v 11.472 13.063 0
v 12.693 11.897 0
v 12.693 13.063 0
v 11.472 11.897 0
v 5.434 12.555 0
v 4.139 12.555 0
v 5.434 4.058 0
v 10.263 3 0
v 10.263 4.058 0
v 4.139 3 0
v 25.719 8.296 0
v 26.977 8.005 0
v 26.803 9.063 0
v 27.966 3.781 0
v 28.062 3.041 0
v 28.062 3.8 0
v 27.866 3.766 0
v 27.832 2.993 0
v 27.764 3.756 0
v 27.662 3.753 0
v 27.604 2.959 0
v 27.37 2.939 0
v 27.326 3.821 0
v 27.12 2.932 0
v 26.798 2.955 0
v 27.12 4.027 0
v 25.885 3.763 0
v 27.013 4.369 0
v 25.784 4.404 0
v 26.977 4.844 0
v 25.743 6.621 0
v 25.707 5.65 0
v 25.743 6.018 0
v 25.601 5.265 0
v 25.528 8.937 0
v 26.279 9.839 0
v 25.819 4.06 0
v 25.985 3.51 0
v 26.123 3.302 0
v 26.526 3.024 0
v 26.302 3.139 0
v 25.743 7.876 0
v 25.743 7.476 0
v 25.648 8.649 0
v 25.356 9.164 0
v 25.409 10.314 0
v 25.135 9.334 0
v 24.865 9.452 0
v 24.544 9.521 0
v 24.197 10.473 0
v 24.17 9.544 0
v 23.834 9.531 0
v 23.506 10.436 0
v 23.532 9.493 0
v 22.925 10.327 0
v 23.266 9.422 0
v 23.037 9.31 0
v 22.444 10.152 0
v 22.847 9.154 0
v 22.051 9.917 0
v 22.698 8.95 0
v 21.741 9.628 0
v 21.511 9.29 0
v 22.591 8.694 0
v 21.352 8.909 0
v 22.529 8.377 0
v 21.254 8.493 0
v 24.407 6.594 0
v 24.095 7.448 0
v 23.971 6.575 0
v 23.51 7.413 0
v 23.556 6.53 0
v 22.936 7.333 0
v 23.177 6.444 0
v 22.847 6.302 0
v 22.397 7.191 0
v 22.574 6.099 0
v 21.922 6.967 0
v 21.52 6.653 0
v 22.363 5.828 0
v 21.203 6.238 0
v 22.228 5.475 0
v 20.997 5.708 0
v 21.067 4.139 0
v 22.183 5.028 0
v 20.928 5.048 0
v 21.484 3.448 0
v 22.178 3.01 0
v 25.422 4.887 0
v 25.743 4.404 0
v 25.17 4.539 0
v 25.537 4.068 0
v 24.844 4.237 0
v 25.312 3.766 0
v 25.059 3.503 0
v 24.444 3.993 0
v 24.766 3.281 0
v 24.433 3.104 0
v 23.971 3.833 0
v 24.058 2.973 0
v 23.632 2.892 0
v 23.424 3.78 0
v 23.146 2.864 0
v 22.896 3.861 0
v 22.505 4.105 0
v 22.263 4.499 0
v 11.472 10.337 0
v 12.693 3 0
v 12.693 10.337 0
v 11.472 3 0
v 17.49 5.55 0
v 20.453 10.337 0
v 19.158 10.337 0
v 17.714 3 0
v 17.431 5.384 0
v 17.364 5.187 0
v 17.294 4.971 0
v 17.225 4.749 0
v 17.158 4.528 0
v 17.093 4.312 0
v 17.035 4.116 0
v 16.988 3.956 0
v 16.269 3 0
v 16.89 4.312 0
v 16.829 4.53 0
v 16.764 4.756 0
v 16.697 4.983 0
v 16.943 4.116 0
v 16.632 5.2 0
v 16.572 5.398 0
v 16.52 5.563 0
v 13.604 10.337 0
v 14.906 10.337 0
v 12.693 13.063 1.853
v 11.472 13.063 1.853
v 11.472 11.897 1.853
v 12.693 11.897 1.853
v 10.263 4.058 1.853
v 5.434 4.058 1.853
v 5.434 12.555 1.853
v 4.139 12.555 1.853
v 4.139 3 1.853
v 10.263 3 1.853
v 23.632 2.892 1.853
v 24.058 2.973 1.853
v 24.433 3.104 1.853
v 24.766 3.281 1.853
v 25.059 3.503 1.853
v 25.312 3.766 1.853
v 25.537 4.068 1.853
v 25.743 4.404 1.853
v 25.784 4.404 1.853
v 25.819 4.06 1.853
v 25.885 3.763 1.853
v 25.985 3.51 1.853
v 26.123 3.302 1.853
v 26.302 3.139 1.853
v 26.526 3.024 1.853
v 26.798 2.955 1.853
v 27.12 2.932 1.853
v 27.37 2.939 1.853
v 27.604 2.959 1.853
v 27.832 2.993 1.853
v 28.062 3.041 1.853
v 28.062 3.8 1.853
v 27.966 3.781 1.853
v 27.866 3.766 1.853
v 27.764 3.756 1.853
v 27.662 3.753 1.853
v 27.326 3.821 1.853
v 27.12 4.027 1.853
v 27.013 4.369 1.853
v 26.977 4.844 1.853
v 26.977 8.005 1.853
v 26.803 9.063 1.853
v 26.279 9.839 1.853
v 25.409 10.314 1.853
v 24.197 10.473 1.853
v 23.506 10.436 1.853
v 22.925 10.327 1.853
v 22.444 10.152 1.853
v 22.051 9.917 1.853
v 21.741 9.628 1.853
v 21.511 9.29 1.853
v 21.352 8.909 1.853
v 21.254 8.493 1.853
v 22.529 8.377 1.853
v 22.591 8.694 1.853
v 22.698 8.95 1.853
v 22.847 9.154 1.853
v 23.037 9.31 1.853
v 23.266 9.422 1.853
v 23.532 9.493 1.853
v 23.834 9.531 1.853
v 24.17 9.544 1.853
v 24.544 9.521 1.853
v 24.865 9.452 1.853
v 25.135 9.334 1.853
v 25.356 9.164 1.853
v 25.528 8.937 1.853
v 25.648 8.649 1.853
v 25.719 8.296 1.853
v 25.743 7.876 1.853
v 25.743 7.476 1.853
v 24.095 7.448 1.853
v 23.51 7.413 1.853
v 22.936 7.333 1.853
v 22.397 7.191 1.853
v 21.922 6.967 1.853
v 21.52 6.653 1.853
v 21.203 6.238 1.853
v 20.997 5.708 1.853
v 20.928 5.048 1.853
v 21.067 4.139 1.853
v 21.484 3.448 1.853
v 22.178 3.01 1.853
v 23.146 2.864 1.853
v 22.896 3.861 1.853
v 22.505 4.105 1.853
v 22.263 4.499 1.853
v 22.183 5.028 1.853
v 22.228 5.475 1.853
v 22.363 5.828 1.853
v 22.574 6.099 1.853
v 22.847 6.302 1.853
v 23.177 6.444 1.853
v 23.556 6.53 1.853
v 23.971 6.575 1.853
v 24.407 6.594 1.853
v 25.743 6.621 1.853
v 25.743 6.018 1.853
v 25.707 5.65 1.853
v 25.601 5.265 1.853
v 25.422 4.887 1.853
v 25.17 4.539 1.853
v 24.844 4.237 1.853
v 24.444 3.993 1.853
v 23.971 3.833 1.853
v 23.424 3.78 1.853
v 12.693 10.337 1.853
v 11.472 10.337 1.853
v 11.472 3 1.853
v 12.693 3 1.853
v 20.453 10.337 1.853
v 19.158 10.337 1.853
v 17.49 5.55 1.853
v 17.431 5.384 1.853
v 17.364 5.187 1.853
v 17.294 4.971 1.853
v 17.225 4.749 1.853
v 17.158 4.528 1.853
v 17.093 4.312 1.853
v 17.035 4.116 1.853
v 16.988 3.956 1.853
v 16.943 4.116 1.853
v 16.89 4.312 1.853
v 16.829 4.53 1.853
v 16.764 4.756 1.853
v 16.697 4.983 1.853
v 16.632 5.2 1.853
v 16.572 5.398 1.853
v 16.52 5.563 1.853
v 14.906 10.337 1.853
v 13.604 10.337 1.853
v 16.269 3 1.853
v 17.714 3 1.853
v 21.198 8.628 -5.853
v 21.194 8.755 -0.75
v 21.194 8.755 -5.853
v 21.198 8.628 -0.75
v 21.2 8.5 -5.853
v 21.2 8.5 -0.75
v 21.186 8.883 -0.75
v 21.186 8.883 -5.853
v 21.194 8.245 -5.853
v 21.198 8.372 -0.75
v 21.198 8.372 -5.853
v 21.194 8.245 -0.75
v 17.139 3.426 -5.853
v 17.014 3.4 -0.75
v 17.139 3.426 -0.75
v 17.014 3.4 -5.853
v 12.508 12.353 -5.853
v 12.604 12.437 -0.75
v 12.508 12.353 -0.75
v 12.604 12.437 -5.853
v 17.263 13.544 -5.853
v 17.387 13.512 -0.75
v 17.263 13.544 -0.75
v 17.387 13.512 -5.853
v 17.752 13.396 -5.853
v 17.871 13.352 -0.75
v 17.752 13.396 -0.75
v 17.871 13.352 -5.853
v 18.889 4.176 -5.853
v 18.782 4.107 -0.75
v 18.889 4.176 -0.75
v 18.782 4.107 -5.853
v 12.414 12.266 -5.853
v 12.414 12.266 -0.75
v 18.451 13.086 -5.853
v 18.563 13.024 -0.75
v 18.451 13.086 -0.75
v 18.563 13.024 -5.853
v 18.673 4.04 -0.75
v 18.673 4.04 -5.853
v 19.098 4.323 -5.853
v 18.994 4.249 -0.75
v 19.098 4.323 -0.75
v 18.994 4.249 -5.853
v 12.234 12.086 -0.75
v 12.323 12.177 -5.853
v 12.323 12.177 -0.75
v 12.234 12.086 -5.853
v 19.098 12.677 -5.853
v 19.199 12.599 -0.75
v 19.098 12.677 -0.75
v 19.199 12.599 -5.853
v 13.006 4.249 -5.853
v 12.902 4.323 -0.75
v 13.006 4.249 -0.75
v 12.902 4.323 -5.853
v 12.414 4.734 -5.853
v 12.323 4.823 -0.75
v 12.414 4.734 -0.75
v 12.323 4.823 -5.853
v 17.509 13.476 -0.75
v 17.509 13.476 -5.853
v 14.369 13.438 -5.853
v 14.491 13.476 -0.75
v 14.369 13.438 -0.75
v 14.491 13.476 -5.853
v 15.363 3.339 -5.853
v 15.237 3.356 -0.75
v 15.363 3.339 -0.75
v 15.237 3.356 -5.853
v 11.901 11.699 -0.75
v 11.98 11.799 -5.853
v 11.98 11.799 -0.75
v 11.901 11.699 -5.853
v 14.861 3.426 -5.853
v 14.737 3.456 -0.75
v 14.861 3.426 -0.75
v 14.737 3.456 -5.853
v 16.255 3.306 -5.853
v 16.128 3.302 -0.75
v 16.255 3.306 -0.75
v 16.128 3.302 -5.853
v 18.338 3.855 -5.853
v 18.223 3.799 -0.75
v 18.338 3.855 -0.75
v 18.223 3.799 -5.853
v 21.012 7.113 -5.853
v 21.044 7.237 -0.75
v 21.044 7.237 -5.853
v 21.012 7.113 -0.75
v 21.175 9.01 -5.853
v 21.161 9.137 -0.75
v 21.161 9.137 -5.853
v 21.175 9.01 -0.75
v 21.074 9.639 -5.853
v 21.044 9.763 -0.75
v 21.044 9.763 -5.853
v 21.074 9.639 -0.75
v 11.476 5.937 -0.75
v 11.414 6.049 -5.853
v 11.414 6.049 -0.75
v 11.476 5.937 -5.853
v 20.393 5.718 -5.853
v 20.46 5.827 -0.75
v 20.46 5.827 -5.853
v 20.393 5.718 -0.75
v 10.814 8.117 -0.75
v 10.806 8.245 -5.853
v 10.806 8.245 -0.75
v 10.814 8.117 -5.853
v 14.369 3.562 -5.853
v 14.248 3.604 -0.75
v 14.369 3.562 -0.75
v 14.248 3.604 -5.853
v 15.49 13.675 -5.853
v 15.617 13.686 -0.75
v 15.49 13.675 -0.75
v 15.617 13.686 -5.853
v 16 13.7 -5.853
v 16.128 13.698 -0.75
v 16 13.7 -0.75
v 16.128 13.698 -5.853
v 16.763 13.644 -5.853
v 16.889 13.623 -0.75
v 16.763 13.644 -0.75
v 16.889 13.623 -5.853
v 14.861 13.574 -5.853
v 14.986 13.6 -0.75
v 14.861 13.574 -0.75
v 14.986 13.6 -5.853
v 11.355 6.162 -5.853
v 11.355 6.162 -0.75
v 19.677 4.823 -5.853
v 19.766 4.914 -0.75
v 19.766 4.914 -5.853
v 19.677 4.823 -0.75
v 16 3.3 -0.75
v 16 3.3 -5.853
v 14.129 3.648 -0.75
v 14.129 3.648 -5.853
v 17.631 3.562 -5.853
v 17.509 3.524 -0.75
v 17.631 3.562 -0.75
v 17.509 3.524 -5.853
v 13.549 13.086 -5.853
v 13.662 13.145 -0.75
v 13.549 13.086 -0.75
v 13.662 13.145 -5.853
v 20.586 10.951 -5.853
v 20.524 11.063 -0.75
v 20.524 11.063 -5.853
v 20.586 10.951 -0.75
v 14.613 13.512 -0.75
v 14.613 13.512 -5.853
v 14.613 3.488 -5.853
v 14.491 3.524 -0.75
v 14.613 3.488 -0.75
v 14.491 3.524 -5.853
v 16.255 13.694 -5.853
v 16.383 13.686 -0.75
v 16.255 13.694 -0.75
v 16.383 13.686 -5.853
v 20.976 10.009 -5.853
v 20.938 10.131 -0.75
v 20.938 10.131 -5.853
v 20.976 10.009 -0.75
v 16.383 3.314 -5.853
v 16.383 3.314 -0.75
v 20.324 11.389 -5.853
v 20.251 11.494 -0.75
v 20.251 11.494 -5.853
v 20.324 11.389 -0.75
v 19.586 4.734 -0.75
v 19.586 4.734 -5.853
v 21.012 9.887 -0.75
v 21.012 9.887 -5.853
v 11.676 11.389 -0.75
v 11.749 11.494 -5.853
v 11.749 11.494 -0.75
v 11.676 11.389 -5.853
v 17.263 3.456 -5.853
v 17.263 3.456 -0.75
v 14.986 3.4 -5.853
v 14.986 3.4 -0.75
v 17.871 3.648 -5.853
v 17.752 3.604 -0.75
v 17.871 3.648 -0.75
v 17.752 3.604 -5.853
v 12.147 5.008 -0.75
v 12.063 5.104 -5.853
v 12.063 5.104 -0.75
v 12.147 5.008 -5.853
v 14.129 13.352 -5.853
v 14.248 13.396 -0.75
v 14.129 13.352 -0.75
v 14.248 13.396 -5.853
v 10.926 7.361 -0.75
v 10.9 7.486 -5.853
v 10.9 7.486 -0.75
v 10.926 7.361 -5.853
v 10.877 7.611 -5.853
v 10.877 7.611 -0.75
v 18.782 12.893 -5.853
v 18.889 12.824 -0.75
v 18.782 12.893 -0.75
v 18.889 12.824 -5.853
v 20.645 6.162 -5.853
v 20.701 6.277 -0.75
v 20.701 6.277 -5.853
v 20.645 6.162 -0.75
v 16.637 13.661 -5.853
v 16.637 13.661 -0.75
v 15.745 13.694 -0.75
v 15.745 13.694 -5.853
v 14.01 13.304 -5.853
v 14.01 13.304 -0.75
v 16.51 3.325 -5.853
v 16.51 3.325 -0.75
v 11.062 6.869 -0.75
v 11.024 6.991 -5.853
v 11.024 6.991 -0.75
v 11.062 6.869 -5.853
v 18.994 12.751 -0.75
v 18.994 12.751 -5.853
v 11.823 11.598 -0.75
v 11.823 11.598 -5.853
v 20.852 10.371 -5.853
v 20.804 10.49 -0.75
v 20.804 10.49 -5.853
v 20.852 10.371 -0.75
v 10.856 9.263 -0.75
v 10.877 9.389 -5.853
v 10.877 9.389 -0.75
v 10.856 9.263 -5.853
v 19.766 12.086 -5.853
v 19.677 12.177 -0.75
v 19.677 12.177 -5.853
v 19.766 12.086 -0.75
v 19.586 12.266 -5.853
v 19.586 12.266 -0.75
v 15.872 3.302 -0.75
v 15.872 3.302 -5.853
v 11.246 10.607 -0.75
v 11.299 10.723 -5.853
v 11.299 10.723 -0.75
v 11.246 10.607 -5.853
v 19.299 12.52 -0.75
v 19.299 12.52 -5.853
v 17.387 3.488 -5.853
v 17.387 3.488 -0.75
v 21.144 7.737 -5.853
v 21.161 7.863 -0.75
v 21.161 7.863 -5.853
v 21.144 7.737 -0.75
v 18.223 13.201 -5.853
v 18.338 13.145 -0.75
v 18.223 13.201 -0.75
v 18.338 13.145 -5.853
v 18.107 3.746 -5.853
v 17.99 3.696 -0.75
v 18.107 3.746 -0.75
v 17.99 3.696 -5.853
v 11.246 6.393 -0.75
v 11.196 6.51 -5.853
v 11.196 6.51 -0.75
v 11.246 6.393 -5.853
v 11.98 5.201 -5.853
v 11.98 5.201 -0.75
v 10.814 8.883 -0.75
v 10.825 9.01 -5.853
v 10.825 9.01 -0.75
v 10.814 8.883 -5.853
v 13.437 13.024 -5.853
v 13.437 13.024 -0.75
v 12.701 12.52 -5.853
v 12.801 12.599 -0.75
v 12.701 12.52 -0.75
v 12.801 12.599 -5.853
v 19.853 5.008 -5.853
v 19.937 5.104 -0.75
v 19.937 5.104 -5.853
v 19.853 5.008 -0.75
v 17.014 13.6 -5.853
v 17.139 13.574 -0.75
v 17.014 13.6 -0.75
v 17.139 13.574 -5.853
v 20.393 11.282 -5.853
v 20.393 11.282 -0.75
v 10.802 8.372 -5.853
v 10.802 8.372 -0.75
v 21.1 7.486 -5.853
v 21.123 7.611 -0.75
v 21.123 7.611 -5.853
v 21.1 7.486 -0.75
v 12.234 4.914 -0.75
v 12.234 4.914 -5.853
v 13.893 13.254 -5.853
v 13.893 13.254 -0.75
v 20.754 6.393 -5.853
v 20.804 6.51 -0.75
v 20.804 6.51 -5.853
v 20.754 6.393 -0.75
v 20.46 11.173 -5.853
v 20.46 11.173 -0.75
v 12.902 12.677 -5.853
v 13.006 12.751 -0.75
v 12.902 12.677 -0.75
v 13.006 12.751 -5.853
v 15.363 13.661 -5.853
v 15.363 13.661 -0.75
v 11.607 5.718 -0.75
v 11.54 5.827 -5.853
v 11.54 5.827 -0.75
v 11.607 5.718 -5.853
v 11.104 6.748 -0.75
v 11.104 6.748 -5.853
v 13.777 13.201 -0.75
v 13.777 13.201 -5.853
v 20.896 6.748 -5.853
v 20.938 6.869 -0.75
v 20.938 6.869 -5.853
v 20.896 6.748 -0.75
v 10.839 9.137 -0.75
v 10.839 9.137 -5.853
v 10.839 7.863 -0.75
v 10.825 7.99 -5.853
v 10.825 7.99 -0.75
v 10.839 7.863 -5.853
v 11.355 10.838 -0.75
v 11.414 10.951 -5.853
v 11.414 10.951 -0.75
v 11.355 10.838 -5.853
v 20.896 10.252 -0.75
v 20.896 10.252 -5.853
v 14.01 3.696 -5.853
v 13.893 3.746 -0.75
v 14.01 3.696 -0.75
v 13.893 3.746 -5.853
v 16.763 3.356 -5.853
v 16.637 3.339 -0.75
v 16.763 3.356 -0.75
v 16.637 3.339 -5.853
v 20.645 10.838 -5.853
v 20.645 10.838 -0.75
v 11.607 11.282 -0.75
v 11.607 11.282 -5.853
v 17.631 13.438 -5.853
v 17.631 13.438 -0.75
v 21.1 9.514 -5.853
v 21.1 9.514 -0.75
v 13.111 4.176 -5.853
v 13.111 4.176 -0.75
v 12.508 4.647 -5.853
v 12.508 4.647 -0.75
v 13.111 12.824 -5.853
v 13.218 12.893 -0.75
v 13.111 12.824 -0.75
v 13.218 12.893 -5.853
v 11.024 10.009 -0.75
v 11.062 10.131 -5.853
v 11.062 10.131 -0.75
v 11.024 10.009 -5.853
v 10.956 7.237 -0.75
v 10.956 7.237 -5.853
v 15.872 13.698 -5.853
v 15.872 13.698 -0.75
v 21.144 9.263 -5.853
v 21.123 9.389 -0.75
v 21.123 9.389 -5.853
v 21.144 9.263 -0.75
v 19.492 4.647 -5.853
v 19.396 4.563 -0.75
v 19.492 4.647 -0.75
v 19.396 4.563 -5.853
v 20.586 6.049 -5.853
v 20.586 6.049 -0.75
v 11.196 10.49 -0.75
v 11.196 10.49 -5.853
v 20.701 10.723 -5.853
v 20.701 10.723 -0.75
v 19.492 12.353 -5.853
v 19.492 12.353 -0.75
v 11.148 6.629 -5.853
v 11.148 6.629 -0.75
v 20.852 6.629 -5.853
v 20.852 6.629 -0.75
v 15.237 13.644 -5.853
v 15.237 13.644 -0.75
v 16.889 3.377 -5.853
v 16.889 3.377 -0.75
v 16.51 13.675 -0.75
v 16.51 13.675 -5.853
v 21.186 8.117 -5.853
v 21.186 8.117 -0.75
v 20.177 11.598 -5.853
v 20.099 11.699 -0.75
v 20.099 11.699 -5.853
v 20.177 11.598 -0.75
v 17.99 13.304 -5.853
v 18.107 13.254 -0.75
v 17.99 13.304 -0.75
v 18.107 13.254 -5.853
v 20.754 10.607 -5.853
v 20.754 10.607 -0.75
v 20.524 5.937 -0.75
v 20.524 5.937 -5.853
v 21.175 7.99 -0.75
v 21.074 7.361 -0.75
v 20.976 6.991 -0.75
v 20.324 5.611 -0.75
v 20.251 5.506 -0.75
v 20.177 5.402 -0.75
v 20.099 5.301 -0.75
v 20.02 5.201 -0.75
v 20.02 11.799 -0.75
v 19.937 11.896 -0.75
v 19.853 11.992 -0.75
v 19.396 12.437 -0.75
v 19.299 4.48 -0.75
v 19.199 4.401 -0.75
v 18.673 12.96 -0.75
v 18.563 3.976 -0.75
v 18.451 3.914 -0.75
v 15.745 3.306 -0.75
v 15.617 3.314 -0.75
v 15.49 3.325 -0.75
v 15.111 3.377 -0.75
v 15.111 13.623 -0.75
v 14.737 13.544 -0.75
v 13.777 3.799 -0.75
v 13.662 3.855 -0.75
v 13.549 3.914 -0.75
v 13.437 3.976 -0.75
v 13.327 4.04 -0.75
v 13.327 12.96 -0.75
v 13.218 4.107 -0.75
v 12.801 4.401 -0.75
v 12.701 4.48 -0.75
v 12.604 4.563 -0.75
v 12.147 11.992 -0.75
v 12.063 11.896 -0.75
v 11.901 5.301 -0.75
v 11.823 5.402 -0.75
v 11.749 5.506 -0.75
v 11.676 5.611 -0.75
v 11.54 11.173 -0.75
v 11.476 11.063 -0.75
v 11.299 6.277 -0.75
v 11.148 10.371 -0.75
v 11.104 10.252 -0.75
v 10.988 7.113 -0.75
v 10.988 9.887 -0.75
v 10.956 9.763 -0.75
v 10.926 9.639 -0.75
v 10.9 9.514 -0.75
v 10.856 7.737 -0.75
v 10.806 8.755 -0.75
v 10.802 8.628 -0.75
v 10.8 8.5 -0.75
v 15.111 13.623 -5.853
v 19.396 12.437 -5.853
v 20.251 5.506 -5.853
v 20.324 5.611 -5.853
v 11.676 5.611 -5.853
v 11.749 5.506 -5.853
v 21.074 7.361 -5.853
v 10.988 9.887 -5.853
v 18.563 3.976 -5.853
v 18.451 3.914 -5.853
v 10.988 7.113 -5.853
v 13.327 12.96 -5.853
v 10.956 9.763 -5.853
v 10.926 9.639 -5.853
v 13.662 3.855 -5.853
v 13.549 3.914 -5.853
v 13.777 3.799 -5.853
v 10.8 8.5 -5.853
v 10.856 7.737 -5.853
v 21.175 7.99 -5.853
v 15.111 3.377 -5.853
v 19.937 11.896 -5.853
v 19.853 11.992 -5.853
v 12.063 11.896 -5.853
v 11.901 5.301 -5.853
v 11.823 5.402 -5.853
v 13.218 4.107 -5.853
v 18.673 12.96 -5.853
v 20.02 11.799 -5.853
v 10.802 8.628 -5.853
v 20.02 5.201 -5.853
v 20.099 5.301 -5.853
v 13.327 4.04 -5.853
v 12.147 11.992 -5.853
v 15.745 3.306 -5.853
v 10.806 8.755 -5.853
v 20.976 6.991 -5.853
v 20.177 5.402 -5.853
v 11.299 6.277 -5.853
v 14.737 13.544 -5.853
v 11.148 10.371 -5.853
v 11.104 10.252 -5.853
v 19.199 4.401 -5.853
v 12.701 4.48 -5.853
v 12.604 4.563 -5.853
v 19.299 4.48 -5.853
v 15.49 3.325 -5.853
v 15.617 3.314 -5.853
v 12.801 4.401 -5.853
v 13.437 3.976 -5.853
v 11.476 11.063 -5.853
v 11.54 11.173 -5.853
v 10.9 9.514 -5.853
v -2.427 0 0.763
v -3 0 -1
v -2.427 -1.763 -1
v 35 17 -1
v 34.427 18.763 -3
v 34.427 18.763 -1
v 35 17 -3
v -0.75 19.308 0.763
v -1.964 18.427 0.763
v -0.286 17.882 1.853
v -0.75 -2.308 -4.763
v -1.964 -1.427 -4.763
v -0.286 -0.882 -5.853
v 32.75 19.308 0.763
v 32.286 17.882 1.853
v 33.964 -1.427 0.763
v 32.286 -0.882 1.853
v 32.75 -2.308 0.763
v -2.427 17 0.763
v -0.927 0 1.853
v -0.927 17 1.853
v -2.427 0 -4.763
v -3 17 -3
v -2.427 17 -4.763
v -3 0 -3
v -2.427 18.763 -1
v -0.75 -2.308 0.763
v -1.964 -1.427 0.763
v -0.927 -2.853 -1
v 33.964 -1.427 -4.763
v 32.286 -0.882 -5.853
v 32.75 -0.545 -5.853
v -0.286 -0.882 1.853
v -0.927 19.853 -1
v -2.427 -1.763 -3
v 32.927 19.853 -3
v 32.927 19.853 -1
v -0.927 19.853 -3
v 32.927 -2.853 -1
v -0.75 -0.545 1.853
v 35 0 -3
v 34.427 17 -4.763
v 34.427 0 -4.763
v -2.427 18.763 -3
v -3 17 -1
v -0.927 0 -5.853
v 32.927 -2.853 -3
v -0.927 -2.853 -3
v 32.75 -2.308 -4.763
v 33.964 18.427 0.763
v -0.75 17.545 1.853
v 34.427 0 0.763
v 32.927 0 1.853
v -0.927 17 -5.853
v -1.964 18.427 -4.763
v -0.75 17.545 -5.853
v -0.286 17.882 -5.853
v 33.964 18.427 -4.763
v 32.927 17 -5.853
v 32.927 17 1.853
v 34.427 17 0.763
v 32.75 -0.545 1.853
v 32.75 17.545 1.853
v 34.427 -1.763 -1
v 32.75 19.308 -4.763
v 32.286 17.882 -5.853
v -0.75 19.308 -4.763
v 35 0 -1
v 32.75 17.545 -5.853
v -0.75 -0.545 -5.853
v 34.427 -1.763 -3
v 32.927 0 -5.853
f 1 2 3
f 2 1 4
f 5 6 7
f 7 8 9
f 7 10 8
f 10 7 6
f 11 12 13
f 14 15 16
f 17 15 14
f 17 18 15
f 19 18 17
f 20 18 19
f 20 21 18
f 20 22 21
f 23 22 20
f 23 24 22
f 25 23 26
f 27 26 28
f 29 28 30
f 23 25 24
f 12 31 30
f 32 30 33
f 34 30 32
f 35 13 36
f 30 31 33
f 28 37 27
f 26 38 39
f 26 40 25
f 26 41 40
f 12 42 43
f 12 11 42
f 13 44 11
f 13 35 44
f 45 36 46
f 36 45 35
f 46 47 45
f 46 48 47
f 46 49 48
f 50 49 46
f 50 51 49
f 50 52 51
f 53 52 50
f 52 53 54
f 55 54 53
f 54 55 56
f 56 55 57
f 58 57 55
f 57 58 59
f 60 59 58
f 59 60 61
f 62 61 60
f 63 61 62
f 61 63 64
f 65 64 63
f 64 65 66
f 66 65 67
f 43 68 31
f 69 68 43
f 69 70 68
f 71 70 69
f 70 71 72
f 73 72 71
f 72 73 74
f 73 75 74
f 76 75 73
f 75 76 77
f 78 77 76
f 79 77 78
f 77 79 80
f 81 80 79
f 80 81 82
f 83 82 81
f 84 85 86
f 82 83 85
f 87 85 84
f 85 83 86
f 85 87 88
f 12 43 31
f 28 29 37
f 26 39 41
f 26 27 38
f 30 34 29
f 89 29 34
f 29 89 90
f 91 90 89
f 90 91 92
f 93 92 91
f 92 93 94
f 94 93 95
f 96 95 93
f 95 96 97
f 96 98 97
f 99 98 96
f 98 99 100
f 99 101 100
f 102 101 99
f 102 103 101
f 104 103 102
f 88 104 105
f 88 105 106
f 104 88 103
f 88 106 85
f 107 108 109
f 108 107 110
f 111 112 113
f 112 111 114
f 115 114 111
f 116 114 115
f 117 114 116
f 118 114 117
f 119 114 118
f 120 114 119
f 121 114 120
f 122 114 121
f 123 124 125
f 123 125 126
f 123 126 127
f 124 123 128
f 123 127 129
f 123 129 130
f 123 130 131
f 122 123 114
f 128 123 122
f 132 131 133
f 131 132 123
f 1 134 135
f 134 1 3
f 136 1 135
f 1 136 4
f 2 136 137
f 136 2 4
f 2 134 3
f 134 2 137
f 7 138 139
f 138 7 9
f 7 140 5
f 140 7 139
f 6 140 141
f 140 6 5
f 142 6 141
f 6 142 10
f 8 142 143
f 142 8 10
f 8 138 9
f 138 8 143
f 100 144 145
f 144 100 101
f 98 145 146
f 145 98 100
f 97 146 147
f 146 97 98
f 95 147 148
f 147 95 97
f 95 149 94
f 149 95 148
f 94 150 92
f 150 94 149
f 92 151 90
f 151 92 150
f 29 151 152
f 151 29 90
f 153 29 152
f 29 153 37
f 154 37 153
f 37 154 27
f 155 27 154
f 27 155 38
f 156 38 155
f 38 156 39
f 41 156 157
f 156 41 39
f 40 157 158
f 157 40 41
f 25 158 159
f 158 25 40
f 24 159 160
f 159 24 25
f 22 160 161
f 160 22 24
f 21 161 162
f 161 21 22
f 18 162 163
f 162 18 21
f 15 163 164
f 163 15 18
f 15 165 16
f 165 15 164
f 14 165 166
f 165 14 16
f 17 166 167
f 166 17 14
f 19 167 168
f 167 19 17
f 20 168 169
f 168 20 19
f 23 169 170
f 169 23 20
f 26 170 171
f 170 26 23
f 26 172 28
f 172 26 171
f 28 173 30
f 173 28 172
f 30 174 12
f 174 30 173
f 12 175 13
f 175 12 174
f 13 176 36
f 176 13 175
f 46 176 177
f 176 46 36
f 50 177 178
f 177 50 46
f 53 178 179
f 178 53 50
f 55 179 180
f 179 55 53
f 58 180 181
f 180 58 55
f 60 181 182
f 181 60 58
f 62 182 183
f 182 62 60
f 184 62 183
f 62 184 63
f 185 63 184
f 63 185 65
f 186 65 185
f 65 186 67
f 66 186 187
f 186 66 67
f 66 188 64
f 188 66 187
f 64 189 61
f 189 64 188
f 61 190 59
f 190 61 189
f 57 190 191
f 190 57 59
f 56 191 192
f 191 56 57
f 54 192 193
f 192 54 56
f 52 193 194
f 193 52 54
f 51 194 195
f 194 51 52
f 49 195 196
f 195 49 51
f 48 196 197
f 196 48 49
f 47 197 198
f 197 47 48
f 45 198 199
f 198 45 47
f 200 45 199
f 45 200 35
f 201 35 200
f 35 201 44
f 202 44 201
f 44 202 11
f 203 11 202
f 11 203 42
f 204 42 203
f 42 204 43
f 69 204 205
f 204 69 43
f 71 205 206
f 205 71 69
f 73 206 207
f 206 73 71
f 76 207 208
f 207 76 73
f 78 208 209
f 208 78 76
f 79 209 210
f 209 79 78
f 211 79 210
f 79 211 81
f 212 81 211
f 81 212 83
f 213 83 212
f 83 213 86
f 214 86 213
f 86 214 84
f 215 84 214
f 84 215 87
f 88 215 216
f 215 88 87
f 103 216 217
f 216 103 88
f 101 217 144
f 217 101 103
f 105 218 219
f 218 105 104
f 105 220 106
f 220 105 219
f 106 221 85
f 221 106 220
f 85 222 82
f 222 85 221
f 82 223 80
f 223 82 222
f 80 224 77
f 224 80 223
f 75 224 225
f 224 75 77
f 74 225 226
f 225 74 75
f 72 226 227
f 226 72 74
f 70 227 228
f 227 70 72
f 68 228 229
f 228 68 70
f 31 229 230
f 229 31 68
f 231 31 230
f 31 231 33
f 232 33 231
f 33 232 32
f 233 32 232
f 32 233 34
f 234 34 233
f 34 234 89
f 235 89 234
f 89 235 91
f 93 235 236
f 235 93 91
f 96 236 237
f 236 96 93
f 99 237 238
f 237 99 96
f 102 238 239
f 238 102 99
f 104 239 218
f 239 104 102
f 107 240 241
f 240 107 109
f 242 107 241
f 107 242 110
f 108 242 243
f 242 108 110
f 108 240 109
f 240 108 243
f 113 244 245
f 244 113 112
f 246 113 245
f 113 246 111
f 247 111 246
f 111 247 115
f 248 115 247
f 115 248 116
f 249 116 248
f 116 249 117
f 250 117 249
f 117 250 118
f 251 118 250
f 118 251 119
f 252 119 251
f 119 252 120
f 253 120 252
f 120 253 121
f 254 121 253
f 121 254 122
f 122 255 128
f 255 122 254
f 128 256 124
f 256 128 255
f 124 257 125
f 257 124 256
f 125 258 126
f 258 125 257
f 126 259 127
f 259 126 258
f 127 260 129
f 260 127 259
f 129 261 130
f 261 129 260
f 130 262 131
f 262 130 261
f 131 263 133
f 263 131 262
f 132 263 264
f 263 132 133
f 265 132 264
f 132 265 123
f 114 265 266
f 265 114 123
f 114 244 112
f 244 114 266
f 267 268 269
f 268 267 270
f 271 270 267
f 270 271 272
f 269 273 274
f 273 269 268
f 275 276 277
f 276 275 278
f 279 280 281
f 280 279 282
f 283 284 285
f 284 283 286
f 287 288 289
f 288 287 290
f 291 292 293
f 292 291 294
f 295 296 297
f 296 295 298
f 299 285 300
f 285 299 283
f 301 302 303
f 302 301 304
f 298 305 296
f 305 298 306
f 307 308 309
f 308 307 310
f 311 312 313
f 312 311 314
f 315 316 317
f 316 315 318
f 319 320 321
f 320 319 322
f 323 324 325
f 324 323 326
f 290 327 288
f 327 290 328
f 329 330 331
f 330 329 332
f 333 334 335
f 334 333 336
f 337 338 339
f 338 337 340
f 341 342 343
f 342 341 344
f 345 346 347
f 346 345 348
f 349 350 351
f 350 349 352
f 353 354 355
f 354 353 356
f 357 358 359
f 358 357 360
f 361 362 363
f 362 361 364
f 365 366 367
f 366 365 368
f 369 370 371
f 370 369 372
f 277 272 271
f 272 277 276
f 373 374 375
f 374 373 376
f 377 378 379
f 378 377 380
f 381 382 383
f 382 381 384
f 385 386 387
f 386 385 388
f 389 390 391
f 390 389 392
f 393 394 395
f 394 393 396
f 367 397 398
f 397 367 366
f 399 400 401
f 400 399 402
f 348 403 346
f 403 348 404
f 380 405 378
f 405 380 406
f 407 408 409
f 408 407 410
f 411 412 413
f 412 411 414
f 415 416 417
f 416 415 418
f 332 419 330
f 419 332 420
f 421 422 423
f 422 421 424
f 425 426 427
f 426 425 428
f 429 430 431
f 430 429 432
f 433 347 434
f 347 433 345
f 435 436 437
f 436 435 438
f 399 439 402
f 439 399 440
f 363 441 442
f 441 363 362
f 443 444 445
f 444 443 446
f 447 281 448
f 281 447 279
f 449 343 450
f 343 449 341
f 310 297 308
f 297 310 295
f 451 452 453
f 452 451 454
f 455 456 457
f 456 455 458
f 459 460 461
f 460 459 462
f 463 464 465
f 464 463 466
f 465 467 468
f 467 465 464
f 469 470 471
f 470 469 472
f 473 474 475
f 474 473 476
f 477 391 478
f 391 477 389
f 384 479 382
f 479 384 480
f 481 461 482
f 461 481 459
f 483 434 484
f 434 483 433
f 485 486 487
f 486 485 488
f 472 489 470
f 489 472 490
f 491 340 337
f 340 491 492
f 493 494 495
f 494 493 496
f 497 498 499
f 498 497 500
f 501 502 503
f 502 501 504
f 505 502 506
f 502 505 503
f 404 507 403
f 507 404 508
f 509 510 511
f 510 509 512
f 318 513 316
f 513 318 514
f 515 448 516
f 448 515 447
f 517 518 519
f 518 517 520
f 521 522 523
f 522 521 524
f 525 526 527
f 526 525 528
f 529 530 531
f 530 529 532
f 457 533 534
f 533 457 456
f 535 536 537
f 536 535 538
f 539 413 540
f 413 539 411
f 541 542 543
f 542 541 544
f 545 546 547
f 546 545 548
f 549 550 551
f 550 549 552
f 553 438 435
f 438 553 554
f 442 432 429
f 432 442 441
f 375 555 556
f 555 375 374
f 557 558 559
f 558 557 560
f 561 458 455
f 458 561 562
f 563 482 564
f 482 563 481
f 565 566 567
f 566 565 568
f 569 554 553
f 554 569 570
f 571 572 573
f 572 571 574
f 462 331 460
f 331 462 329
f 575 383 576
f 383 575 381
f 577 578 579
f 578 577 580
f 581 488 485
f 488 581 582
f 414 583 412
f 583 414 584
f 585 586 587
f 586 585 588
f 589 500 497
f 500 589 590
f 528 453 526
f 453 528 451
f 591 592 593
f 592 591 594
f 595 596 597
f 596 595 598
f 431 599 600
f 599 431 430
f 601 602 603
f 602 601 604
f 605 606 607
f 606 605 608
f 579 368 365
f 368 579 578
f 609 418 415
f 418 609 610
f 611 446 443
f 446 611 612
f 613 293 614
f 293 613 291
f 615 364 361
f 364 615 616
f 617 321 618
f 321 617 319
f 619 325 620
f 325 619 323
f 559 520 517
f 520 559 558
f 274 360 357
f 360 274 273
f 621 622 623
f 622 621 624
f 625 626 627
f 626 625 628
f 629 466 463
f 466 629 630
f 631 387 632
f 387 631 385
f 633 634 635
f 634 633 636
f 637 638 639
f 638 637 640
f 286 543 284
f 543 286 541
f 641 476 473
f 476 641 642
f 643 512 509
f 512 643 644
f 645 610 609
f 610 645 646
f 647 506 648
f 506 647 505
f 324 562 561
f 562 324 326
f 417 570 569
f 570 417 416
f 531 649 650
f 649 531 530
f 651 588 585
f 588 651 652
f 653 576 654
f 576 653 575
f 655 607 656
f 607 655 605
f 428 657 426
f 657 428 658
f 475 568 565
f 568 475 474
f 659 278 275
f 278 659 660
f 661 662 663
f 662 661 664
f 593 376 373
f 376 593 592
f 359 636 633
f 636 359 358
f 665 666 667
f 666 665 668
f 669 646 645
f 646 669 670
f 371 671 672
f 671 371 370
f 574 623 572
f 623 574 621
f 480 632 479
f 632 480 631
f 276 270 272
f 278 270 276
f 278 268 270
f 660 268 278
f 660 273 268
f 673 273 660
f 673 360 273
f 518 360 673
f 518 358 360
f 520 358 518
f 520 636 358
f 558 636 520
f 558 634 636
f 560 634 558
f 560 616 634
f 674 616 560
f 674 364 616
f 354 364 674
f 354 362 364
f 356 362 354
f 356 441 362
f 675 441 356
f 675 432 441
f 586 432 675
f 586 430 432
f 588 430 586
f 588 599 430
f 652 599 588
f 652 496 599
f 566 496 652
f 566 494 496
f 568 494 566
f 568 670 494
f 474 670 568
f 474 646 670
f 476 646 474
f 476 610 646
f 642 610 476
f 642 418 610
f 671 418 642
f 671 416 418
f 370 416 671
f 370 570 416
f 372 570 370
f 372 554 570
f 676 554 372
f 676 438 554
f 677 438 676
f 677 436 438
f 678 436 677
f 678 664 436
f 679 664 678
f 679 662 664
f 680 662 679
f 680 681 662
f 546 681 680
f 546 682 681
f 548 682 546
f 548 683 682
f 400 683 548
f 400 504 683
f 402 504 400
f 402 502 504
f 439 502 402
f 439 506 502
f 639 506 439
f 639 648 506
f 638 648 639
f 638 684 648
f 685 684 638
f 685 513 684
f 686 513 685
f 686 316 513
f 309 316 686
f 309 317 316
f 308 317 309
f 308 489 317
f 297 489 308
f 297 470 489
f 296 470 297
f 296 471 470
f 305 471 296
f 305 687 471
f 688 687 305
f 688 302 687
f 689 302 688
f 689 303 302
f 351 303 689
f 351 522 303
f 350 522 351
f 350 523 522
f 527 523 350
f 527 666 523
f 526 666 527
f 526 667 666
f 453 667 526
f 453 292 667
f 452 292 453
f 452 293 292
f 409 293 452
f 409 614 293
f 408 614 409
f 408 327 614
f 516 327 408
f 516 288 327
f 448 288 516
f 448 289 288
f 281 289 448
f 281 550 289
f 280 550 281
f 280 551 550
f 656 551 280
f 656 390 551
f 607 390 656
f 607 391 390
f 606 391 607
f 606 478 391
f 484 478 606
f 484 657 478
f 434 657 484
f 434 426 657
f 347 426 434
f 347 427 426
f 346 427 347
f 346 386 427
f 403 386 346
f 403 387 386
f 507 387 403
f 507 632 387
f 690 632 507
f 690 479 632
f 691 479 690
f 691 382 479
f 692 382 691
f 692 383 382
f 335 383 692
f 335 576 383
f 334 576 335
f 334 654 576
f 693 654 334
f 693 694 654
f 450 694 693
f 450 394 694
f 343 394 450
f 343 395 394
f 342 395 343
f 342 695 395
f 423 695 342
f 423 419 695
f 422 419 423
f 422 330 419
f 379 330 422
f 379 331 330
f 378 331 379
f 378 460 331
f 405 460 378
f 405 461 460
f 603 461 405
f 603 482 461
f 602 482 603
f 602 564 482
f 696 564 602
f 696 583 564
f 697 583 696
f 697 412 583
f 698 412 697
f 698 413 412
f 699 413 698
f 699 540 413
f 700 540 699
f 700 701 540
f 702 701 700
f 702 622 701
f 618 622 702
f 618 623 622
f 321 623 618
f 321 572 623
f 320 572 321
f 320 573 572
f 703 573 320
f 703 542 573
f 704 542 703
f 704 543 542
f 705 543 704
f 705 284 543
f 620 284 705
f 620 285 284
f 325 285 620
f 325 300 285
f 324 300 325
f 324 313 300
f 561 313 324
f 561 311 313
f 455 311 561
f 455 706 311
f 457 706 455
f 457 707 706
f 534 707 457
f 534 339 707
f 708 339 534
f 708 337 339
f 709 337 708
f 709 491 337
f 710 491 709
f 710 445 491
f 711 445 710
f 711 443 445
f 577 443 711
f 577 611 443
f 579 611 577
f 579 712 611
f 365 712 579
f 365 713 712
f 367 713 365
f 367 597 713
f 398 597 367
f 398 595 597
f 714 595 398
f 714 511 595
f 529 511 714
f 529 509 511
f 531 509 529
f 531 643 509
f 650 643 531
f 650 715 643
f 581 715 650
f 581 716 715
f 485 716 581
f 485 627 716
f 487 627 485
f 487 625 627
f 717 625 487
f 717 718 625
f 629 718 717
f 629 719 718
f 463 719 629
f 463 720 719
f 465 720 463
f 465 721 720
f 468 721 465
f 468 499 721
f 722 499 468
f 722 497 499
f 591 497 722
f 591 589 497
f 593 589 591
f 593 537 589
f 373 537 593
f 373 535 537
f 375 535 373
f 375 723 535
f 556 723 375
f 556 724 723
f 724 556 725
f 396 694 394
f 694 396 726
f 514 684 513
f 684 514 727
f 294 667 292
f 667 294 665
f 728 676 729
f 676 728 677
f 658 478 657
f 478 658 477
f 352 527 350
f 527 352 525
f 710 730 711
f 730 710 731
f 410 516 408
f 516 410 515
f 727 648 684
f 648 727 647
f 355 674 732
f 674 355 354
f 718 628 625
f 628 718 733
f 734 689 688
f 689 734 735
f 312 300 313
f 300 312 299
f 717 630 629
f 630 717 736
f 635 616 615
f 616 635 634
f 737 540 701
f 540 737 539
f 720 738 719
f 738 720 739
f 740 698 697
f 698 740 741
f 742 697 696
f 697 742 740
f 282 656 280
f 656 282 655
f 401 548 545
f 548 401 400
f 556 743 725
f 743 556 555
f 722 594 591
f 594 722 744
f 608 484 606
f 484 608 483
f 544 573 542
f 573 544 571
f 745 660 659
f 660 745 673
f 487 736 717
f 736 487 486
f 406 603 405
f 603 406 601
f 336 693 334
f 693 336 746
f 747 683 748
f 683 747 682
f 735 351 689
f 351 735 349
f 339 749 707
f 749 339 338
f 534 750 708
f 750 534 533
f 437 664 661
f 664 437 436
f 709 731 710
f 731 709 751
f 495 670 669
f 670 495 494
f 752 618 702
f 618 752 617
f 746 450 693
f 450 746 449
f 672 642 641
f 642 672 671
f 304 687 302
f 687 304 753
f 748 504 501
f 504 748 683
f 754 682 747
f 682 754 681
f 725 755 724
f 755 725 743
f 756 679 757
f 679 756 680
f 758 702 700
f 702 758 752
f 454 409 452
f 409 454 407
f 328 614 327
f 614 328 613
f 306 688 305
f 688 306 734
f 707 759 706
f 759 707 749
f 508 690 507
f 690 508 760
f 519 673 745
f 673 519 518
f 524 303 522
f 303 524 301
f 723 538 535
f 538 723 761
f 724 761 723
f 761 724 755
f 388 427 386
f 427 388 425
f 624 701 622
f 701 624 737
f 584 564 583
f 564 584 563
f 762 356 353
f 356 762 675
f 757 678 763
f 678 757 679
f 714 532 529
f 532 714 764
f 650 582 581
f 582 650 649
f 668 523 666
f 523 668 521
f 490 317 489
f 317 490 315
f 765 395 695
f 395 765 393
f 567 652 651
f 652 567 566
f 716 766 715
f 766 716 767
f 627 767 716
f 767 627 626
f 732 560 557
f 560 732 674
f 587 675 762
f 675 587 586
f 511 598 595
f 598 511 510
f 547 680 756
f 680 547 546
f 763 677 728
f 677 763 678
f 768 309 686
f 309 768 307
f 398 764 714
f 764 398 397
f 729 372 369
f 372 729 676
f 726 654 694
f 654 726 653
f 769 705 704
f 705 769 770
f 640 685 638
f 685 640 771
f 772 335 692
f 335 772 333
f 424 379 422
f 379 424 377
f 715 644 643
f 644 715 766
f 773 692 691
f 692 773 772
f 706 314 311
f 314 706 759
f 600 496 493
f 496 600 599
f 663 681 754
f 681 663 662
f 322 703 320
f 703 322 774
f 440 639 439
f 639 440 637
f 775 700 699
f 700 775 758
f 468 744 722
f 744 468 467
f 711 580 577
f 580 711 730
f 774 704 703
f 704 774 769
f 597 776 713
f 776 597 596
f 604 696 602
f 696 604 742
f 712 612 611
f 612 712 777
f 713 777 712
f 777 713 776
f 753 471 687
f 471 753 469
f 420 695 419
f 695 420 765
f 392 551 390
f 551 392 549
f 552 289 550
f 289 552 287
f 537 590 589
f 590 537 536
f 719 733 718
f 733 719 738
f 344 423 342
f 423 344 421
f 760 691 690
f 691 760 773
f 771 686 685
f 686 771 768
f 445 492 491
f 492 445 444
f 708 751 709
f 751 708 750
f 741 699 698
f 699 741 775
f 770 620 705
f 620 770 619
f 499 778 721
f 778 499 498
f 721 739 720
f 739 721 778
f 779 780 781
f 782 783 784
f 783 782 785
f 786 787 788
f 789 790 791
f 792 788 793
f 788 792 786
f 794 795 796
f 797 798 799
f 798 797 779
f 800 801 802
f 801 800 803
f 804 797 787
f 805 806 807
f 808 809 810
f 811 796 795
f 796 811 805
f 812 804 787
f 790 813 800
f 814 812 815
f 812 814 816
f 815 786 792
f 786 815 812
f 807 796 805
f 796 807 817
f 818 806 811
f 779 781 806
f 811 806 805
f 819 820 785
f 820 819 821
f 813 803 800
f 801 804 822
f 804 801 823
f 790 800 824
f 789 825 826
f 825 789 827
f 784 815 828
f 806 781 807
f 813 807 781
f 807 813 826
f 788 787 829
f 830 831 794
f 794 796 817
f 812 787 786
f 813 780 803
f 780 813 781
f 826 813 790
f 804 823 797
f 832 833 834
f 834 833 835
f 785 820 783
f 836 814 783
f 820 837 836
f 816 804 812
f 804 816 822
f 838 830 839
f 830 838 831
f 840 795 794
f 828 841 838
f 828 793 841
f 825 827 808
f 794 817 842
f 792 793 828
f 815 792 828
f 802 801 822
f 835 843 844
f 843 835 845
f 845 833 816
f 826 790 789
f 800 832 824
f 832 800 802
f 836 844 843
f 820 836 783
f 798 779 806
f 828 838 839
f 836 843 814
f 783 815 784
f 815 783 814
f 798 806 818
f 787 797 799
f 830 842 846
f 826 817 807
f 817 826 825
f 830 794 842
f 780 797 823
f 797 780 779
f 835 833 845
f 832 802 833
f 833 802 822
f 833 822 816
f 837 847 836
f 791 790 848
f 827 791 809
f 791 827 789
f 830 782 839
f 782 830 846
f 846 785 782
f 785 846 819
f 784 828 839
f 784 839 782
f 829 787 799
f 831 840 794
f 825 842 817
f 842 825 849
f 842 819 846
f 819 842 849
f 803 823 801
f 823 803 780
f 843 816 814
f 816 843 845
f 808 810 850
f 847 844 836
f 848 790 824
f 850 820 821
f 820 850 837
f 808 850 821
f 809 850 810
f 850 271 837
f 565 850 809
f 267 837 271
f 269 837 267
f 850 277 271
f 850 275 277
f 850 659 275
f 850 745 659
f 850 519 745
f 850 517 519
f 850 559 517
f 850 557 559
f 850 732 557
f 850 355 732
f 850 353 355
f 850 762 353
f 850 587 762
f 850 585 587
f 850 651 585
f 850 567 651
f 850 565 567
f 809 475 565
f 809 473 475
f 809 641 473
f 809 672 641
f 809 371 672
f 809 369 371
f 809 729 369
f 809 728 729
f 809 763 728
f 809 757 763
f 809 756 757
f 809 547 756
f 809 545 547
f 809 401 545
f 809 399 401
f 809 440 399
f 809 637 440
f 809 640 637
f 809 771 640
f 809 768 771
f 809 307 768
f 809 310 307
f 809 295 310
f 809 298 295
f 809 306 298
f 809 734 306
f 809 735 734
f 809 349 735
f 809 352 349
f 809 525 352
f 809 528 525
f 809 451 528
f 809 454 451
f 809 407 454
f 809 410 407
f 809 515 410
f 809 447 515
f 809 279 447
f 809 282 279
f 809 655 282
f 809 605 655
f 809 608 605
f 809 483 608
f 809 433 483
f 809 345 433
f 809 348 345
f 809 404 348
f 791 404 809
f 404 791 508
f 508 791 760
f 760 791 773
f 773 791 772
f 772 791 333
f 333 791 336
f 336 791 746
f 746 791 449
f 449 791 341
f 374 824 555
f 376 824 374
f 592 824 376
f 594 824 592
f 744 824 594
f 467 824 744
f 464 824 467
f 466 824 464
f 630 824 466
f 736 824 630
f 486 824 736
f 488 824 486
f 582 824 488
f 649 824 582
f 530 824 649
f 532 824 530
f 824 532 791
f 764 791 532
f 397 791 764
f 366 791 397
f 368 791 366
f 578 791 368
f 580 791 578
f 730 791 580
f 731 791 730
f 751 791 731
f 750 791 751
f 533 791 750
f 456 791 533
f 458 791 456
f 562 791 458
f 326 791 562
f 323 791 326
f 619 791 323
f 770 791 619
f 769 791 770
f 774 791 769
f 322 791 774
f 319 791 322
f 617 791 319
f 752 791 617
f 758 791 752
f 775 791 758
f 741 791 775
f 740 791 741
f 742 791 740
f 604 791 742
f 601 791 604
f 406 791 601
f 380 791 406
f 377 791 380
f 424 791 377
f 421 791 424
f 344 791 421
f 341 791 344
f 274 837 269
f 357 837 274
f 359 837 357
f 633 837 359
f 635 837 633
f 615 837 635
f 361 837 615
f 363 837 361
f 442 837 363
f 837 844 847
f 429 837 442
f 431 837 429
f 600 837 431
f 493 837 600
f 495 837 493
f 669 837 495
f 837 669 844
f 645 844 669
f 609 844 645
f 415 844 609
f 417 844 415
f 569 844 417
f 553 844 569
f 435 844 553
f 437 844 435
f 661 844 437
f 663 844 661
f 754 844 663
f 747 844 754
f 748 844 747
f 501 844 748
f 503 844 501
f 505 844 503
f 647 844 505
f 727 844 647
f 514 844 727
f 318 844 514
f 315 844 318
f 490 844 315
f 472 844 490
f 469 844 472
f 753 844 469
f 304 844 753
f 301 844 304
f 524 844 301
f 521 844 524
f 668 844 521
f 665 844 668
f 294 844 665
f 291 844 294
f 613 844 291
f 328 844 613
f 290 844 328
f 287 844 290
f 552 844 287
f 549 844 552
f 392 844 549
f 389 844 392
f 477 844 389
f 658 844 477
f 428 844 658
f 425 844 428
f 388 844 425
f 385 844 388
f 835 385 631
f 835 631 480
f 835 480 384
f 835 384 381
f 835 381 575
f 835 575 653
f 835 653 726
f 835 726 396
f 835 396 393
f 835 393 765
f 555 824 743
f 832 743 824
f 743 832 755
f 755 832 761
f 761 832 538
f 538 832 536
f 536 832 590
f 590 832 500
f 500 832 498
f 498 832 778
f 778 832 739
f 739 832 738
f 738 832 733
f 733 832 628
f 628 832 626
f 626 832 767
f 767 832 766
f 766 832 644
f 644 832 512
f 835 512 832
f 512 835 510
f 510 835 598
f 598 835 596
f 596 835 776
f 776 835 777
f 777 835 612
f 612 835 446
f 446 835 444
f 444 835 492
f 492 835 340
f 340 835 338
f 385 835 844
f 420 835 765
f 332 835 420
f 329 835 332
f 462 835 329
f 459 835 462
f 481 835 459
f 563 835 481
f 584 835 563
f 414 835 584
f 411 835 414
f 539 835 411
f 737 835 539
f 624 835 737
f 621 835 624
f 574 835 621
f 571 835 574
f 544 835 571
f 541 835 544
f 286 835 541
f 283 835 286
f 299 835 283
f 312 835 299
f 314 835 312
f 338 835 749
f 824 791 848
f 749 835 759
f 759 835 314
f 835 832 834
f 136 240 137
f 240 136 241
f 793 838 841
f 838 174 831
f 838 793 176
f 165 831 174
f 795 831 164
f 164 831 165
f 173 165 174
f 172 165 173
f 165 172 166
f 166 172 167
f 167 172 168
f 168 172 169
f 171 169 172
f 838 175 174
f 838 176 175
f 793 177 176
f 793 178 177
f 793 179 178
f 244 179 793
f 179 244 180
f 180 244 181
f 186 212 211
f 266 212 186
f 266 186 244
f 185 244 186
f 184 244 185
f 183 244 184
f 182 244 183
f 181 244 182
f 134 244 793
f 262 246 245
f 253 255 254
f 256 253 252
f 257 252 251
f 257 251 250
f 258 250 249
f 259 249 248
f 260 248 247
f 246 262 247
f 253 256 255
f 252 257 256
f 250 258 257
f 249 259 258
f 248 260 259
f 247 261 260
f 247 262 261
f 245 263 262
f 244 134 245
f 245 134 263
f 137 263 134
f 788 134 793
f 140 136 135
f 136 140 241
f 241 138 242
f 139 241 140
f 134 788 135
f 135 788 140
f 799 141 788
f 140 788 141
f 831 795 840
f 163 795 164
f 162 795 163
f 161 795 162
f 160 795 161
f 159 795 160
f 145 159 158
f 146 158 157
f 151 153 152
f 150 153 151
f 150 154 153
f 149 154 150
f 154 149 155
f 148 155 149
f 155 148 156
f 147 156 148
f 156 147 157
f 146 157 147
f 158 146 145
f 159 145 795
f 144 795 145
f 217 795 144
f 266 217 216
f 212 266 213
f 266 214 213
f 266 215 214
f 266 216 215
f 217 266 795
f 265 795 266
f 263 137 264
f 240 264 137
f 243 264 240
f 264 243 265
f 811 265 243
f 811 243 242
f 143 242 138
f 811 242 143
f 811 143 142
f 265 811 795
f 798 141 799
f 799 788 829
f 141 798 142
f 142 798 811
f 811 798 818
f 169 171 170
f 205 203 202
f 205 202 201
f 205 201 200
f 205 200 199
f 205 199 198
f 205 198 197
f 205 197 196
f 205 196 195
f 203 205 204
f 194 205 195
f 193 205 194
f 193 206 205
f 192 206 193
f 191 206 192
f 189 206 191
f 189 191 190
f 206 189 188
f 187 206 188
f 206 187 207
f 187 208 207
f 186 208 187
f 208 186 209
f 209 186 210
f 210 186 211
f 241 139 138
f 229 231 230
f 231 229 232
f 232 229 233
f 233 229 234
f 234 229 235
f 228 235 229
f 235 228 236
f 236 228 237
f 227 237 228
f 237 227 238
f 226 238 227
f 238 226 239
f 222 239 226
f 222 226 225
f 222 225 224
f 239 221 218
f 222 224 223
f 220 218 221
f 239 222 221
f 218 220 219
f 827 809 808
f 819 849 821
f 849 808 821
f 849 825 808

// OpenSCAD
/*
Parametric Magnetic Name Sign
http://www.thingiverse.com/thing:1278048/

By Paul Houghton
Twitter: @mobile_rat
Email: paulirotta@gmail.com
Blog: http://paul-houghton.com/

Creative Commons Attribution ShareAlike License
https://creativecommons.org/licenses/by-sa/4.0/legalcode
*/


/* [Parametric Magnetic Name Sign options] */

// Sign text
text="Liva";

// Sign length
sign_length=32;

// Text X offset
text_x=3;

// Text Y offset
text_y=3;

// Sign width
sign_width=17;

// Sign thickness
sign_thickness=2; // +2*rounding as with other dimensions

// Radius of corner rounding
radius=3;

// Radius of magnet
magnet_radius=5.2;

// Thickness of magnet
magnet_thickness=5.15;

// Number of facets for approximating a sphere
$fn=10; // #sides to a circle. Try big and small numbers

sign(line1=text);

module sign(line1="Line1") {        
    difference() {
        translate([0,0,-radius]) minkowski() {
            cube([sign_length,sign_width,sign_thickness]);
            sphere(r=radius);
        }

        union() {
            translate([text_x,text_y,0]) linear_extrude(height=3) text(line1);
            magnet_hole();
        }
    }
 }

module magnet_hole() {
    translate([-radius+(sign_length + 2*radius)/2,-radius+(sign_width+2*radius)/2,-sign_thickness-radius-.9])
        cylinder($fn=256, r=magnet_radius, h=magnet_thickness);
}
